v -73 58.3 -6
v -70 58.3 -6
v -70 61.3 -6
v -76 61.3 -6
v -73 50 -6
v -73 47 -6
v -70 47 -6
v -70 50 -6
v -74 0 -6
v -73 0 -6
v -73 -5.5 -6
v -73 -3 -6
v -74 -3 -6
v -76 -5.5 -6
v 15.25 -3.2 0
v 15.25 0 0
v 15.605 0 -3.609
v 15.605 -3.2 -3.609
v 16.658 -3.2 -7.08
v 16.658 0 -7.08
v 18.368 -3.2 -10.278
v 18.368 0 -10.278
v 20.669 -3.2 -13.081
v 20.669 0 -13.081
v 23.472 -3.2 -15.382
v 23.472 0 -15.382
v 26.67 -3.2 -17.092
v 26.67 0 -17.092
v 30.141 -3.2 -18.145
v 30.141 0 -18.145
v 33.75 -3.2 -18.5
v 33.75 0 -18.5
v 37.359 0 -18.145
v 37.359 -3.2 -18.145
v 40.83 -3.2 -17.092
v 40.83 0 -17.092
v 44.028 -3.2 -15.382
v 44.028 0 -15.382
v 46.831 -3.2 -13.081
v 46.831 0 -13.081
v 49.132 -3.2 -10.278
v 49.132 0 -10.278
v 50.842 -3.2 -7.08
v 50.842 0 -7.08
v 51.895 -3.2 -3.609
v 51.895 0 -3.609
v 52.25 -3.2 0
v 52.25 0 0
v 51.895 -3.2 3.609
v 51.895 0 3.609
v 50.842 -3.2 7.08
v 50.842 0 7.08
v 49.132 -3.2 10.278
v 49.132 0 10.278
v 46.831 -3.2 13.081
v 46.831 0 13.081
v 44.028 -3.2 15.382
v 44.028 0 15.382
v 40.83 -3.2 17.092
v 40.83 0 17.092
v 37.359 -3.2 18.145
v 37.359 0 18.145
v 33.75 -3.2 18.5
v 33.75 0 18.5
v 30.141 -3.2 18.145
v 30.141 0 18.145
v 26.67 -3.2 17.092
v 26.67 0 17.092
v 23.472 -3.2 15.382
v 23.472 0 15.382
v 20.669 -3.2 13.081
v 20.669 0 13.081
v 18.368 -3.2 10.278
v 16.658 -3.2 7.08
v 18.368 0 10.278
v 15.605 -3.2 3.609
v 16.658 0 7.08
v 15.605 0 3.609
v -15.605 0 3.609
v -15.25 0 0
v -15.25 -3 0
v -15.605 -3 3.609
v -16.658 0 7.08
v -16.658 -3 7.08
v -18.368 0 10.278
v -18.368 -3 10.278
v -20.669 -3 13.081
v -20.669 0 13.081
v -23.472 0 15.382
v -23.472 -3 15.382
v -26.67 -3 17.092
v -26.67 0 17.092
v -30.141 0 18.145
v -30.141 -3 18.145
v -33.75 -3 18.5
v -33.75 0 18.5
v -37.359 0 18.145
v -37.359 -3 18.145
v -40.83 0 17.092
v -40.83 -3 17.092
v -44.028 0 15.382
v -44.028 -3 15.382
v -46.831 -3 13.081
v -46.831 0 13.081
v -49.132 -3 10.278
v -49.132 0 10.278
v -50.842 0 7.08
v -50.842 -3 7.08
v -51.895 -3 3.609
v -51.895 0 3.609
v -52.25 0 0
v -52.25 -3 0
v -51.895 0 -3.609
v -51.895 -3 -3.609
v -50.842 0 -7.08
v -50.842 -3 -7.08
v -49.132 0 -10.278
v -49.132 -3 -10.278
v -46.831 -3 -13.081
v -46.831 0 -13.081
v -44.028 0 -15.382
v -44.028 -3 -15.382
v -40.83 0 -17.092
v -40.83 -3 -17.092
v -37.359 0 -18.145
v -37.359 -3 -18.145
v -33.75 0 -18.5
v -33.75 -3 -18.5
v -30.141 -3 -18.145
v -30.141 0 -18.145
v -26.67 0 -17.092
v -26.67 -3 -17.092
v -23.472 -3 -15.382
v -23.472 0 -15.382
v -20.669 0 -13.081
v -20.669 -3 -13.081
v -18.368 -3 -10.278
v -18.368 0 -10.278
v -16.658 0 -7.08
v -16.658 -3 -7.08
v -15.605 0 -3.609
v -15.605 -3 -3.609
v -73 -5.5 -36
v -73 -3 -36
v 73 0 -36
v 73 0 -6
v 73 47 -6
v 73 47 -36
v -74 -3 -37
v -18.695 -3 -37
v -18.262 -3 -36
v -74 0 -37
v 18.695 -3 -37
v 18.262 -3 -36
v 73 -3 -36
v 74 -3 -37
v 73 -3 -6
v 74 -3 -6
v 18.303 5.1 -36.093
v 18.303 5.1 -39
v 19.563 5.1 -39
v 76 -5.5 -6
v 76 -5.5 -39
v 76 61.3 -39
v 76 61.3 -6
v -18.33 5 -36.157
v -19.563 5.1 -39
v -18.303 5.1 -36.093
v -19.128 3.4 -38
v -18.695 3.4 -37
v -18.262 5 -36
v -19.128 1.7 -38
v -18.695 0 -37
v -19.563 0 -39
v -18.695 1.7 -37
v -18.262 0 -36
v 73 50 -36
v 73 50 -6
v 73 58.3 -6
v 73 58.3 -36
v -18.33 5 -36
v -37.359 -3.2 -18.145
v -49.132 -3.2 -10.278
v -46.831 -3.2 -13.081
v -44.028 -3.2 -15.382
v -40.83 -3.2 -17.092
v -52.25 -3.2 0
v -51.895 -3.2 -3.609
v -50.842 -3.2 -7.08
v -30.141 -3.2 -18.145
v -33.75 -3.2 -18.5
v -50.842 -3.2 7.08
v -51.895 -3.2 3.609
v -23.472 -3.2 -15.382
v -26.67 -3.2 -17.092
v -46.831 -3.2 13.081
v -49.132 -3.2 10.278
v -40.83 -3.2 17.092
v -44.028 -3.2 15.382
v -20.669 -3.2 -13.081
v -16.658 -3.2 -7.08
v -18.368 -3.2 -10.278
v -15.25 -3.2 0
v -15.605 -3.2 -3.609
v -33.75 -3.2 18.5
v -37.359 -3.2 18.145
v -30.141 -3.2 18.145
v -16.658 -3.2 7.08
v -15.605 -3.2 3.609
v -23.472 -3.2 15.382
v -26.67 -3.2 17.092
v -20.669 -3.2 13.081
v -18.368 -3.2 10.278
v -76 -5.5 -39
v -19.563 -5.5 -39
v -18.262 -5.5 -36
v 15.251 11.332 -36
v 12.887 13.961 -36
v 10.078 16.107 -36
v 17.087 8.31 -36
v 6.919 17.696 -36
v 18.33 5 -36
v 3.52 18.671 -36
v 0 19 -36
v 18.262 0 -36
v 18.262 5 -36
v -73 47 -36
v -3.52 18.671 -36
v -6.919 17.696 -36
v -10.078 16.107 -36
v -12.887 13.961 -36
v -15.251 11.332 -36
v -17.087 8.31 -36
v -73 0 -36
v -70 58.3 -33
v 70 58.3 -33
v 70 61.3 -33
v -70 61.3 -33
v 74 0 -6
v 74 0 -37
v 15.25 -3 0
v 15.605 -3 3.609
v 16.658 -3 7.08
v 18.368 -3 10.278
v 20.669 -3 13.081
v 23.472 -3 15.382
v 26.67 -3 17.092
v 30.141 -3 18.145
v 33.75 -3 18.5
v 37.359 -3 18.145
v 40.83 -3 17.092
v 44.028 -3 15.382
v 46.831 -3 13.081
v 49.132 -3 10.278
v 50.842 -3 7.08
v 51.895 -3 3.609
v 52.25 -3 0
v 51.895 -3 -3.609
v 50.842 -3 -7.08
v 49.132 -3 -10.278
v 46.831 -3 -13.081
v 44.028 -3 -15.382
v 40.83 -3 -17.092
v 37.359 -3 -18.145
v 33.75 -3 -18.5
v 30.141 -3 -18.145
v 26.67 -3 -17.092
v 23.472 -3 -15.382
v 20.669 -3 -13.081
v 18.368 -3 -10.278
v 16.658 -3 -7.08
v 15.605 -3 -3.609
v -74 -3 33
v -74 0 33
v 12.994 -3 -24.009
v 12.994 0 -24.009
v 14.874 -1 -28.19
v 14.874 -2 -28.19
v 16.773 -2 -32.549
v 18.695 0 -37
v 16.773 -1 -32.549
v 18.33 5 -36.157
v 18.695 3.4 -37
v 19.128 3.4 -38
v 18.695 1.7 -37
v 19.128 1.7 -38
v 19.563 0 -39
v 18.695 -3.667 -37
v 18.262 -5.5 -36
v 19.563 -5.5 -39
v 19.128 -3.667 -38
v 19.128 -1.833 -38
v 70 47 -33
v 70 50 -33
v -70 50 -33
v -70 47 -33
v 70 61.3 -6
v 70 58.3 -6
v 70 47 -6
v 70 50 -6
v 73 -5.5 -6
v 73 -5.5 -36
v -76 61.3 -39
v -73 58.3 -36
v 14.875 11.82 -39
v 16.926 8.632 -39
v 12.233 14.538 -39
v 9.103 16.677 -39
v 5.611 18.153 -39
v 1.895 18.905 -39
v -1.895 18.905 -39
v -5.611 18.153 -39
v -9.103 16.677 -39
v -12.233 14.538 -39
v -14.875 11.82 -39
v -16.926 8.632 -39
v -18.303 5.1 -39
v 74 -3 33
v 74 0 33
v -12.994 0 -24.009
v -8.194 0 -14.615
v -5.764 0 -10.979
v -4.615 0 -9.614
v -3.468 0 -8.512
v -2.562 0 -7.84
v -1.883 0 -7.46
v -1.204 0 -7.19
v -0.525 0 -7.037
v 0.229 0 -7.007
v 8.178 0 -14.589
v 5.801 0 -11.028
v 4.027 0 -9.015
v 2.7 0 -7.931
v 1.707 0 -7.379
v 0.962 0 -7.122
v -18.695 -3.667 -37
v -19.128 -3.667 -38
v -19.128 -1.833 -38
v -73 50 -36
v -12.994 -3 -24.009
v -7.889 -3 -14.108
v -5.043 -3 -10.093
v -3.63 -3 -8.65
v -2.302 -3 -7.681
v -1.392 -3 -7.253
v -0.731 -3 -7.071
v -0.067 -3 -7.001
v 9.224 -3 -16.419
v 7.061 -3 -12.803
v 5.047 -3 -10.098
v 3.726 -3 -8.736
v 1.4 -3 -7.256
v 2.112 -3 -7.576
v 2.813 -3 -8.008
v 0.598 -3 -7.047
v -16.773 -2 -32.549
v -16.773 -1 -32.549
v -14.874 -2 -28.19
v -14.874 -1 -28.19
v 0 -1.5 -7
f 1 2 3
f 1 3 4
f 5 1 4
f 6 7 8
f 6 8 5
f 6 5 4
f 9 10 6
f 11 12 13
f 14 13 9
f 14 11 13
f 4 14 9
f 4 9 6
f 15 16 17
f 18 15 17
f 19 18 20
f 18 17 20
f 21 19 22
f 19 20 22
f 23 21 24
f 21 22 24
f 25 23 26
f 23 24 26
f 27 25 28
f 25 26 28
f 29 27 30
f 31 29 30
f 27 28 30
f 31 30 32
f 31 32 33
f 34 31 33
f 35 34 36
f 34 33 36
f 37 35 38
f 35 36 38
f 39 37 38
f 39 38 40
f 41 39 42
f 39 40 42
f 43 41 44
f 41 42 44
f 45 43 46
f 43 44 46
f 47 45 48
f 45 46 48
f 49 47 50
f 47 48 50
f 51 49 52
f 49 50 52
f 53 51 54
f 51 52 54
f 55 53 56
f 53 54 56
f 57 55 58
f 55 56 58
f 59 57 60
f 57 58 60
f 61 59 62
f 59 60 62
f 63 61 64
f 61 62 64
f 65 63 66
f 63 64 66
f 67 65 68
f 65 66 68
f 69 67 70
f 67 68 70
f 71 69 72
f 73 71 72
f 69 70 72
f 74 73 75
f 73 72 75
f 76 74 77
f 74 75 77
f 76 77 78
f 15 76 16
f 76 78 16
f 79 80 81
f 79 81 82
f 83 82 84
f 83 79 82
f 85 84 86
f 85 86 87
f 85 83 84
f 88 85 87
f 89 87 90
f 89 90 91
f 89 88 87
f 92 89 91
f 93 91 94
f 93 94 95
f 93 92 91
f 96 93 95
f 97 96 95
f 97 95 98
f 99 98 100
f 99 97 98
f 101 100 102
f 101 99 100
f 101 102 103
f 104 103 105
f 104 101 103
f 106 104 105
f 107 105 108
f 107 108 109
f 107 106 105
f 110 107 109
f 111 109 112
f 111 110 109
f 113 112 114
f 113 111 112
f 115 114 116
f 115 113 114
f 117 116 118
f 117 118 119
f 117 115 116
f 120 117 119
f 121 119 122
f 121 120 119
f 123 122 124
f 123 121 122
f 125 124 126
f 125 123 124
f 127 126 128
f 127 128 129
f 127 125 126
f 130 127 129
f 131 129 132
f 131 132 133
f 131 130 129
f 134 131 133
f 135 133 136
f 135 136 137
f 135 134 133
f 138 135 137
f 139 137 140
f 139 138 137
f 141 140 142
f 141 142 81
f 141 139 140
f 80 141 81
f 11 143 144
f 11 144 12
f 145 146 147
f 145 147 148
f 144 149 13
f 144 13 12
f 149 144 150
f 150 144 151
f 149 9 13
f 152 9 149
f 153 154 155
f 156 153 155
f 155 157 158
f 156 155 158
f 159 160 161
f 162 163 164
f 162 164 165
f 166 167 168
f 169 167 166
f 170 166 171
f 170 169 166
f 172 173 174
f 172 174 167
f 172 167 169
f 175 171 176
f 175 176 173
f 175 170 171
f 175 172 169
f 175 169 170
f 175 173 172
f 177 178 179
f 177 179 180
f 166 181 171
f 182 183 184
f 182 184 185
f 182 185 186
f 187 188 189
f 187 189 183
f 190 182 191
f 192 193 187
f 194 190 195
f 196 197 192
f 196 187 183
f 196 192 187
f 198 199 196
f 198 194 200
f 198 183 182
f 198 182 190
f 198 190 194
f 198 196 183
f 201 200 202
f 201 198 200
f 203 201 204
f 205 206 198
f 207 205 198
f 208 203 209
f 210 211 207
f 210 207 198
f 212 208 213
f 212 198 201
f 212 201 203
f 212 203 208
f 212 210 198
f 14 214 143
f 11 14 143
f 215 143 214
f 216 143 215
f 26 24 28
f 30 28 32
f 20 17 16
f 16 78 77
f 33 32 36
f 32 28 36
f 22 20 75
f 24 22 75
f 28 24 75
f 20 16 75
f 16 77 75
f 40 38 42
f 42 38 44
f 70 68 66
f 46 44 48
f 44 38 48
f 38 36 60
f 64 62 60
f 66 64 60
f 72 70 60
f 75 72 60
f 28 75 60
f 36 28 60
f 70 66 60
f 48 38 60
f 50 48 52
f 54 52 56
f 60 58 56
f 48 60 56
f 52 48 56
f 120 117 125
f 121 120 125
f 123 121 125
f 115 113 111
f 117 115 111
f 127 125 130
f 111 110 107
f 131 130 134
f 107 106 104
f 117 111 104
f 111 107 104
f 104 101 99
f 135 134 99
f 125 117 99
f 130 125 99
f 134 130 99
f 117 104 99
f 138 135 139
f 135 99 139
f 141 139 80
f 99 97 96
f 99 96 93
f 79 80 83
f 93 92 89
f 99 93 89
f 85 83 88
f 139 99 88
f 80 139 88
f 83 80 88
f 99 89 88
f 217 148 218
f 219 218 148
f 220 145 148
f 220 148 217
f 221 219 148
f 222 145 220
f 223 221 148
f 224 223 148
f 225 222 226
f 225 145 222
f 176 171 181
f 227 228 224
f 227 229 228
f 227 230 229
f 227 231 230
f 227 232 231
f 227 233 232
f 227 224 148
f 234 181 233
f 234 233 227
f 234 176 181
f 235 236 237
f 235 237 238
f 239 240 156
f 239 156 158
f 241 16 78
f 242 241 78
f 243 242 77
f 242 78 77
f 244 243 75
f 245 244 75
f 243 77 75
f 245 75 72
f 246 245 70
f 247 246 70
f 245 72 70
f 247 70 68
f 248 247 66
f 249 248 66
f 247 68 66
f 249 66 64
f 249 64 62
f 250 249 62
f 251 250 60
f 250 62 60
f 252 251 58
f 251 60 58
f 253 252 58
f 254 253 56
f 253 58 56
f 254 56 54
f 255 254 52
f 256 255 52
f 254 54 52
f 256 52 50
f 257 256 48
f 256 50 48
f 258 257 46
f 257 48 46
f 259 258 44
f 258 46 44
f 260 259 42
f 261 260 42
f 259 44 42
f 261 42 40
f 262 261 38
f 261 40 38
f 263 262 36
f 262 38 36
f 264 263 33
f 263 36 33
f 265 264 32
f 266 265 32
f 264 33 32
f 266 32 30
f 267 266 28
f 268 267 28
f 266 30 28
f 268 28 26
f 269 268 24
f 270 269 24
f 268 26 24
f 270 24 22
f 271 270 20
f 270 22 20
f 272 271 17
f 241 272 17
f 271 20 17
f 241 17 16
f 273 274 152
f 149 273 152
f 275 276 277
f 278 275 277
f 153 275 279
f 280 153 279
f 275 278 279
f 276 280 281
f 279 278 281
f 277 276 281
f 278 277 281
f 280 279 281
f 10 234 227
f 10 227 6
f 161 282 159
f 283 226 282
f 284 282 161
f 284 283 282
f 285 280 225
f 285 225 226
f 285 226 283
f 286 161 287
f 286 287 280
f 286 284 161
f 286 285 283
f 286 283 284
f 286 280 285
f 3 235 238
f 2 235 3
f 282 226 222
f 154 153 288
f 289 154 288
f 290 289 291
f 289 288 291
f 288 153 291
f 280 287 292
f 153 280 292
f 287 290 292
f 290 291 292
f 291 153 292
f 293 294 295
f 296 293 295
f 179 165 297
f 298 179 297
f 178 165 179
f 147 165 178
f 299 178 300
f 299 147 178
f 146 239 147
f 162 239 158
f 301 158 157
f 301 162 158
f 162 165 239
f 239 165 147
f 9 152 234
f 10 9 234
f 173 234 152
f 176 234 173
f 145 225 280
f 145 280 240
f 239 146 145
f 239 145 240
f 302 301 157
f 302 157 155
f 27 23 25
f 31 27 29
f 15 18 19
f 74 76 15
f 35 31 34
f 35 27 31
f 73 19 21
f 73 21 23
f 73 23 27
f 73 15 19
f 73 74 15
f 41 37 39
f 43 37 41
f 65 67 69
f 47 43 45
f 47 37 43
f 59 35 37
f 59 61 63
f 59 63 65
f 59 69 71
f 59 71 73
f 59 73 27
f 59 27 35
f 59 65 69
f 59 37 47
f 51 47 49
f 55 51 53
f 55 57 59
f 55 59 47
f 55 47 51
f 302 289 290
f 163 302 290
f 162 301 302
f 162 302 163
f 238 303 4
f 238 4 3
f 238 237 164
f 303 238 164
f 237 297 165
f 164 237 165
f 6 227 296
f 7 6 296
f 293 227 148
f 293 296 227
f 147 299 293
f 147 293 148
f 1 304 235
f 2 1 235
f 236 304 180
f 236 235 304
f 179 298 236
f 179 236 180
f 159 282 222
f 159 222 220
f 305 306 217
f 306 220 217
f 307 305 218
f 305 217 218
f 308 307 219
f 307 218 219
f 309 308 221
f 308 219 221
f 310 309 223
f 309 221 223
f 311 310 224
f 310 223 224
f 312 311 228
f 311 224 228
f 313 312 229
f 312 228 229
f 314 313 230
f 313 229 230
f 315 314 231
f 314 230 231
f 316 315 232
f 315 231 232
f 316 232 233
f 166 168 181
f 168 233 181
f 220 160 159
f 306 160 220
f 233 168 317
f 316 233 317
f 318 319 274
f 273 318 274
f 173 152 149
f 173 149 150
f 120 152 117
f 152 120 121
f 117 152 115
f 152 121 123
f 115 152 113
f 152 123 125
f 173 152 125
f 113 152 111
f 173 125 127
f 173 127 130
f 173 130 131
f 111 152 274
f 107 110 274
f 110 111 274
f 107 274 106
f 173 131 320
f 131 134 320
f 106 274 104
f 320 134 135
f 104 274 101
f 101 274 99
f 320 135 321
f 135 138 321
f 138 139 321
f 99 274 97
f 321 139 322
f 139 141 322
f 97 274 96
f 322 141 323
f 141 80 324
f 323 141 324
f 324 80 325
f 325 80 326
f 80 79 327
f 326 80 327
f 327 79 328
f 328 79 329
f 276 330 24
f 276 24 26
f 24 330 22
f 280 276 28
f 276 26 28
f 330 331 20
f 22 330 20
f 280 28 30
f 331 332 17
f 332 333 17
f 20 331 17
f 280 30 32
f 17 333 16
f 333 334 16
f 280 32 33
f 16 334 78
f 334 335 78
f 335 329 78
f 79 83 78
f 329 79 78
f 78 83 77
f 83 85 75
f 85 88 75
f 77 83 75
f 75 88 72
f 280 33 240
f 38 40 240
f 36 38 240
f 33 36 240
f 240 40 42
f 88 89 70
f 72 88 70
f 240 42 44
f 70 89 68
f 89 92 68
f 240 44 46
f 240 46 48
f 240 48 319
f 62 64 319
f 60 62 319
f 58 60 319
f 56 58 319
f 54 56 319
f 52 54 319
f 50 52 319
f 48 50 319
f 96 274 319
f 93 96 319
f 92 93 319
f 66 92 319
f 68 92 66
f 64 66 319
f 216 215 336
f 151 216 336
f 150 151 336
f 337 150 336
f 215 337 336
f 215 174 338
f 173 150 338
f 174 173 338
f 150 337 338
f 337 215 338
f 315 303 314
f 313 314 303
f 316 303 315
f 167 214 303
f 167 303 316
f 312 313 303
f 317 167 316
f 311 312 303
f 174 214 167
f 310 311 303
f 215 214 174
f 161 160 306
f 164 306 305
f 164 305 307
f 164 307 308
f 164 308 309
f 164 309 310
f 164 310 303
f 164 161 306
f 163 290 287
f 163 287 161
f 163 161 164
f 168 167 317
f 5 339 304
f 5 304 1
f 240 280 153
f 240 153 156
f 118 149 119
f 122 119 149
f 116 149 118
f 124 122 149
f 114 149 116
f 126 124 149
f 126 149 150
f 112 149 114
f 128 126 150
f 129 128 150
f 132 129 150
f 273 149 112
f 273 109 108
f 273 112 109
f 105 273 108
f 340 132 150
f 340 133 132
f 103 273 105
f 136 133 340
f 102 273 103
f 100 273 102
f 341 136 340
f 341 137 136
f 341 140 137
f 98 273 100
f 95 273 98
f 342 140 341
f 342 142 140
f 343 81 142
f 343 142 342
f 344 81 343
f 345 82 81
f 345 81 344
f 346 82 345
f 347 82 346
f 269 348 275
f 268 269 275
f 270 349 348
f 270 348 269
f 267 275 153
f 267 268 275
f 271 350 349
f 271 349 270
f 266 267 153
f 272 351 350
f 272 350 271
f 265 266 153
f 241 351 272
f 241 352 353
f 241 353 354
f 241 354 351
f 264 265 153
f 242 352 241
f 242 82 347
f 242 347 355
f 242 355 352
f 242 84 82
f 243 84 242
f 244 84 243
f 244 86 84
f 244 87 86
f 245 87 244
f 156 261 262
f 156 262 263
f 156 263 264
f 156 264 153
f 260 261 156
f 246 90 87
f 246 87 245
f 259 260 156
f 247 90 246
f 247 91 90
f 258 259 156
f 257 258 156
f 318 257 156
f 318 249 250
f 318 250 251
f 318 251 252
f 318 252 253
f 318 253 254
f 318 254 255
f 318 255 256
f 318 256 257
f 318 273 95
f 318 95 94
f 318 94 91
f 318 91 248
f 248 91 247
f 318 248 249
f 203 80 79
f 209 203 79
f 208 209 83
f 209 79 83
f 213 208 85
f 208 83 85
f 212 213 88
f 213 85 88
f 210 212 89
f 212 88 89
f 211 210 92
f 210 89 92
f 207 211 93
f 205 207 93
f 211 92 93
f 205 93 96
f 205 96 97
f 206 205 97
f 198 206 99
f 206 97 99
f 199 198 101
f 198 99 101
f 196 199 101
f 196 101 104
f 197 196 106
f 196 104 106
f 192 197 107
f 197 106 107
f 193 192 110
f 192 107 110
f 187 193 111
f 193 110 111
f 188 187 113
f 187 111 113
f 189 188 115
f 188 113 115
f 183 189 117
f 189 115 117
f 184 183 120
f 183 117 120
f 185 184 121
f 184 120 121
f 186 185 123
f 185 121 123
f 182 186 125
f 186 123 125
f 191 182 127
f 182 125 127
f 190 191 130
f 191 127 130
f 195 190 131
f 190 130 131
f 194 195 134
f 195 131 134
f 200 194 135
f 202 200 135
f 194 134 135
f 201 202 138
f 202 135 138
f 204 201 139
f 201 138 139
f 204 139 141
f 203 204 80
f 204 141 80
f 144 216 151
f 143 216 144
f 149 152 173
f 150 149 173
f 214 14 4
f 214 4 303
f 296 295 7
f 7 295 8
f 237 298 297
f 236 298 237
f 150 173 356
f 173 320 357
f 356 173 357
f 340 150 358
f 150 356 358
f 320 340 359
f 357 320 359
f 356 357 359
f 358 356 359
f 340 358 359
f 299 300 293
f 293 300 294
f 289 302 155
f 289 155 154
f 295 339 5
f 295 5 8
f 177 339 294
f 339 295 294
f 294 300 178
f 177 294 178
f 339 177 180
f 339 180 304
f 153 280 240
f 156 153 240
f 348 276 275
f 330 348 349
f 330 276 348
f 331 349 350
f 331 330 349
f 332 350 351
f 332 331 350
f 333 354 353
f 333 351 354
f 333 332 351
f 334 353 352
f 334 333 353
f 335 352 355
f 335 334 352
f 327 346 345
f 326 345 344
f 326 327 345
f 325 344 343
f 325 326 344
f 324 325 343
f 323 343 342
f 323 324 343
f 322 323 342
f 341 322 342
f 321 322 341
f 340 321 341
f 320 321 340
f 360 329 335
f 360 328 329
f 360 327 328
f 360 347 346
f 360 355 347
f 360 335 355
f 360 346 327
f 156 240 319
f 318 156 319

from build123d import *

# Parameters (mm, degrees)
F0_R           = 18.5
F1_DEPTH       = 3.2
F5_DEPTH       = 55.5
F5_DEPTH_BACK  = 11.3
F6_R           = 18.5
F7_DEPTH       = 3
F8_DEPTH       = 3
F10_DEPTH      = 26.3
F10_DEPTH_BACK = 5.1
F12_DEPTH      = 63.1
F14_DEPTH      = 3
F17_DEPTH      = 3


with BuildPart() as f1:
    # F0 (on Front) → F1 (new body)
    with BuildSketch(Plane.XZ):
        with BuildLine():
            ThreePointArc((52.25, 0), (33.75, 18.5), (15.25, 0))
            ThreePointArc((15.25, 0), (33.75, -18.5), (52.25, 0))
        make_face()
        with Locations((-33.75, 0)):
            Circle(F0_R)
    extrude(amount=F1_DEPTH)


with BuildPart() as f5:
    # F4 (on offset) → F5 (new body, two sides)
    with BuildSketch(Plane.XZ.offset(-50)) as f5_sk:
        Polygon((-73, -36), (-73, -6), (-76, -6), (-76, -39), (76, -39), (76, -6), (73, -6), (73, -36), (0, -36), align=None)
    extrude(amount=F5_DEPTH)
    extrude(f5_sk.sketch, amount=-F5_DEPTH_BACK)

    # F6 (on Front) → F7 (cut)
    with BuildSketch(Plane.XZ):
        Polygon((74, 33), (0, 33), (-74, 33), (-74, -37), (74, -37), align=None)
        with Locations((-33.75, 0)):
            Circle(F6_R, mode=Mode.SUBTRACT)
        with BuildLine():
            ThreePointArc((52.25, 0), (33.75, -18.5), (15.25, 0))
            ThreePointArc((15.25, 0), (33.75, 18.5), (52.25, 0))
        make_face(mode=Mode.SUBTRACT)
        Polygon((-74, 33), (0, 33), (74, 33), (74, 43), (-74, 43), align=None)
    extrude(amount=F7_DEPTH, mode=Mode.SUBTRACT)


with BuildPart() as f8:
    # F6 (on Front) → F8 (new body)
    with BuildSketch(Plane.XZ):
        Polygon((74, 33), (0, 33), (-74, 33), (-74, -37), (74, -37), align=None)
        with Locations((-33.75, 0)):
            Circle(F6_R, mode=Mode.SUBTRACT)
        with BuildLine():
            ThreePointArc((52.25, 0), (33.75, -18.5), (15.25, 0))
            ThreePointArc((15.25, 0), (33.75, 18.5), (52.25, 0))
        make_face(mode=Mode.SUBTRACT)
    extrude(amount=F8_DEPTH)


with BuildPart() as f10_tool:
    # F9 (on Front) → F10 (new body, two sides)
    with BuildSketch(Plane.XZ) as f10_sk:
        with BuildLine():
            Line((-12.99393, -24.008975), (-20, -40))
            Line((-20, -40), (0, -40))
            Line((0, -40), (0, -7))
            add(Edge.make_bspline(
                [(-12.99393, -24.008975), (-8.565404, -14.390823), (-4.282702, -7), (0, -7)],
                knots=[13.15122, 13.15122, 13.15122, 13.15122, 38.587563, 38.587563, 38.587563, 38.587563], degree=3))
        make_face()
        with BuildLine():
            add(Edge.make_bspline(
                [(-20, -40), (-17.612226, -34.550019), (-15.283588, -28.981798), (-12.99393, -24.008975)],
                knots=[0, 0, 0, 0, 13.15122, 13.15122, 13.15122, 13.15122], degree=3))
            Line((-20, -40), (-12.99393, -24.008975))
        make_face()
        with BuildLine():
            Line((0, -7), (0, -40))
            Line((0, -40), (20, -40))
            Line((20, -40), (12.99393, -24.008975))
            add(Edge.make_bspline(
                [(0, -7), (4.282702, -7), (8.565404, -14.390823), (12.99393, -24.008975)],
                knots=[38.587563, 38.587563, 38.587563, 38.587563, 64.023906, 64.023906, 64.023906, 64.023906], degree=3))
        make_face()
        with BuildLine():
            Line((12.99393, -24.008975), (20, -40))
            add(Edge.make_bspline(
                [(12.99393, -24.008975), (15.283588, -28.981798), (17.612226, -34.550019), (20, -40)],
                knots=[64.023906, 64.023906, 64.023906, 64.023906, 77.175126, 77.175126, 77.175126, 77.175126], degree=3))
        make_face()
    extrude(amount=F10_DEPTH)
    extrude(f10_sk.sketch, amount=-F10_DEPTH_BACK)


with BuildPart() as f5_1:
    add(f5.part)

    # F10: cut by f10_tool
    add(f10_tool.part, mode=Mode.SUBTRACT)

    # F11 (on Top) → F12 (cut)
    with BuildSketch(Plane.XY):
        with BuildLine():
            Line((-18.330303, 5), (18.330303, 5))
            ThreePointArc((18.330303, 5), (0, 19), (-18.330303, 5))
        make_face()
    extrude(amount=-F12_DEPTH, mode=Mode.SUBTRACT)

    # F13 (on offset) → F14 (join)
    with BuildSketch(Plane.XZ.offset(-50)):
        Polygon((73, -36), (73, -6), (70, -6), (70, -33), (-70, -33), (-70, -6), (-73, -6), (-73, -36), align=None)
    extrude(amount=F14_DEPTH)

    # F16 (on offset) → F17 (join)
    with BuildSketch(Plane.XZ.offset(-58.3)):
        Polygon((73, -36), (73, -6), (70, -6), (70, -33), (-70, -33), (-70, -6), (-73, -6), (-73, -36), align=None)
    extrude(amount=-F17_DEPTH)


with BuildPart() as f8_1:
    add(f8.part)

    # F10: cut by f10_tool
    add(f10_tool.part, mode=Mode.SUBTRACT)


solid = Compound([f1.part, f5_1.part, f8_1.part])
